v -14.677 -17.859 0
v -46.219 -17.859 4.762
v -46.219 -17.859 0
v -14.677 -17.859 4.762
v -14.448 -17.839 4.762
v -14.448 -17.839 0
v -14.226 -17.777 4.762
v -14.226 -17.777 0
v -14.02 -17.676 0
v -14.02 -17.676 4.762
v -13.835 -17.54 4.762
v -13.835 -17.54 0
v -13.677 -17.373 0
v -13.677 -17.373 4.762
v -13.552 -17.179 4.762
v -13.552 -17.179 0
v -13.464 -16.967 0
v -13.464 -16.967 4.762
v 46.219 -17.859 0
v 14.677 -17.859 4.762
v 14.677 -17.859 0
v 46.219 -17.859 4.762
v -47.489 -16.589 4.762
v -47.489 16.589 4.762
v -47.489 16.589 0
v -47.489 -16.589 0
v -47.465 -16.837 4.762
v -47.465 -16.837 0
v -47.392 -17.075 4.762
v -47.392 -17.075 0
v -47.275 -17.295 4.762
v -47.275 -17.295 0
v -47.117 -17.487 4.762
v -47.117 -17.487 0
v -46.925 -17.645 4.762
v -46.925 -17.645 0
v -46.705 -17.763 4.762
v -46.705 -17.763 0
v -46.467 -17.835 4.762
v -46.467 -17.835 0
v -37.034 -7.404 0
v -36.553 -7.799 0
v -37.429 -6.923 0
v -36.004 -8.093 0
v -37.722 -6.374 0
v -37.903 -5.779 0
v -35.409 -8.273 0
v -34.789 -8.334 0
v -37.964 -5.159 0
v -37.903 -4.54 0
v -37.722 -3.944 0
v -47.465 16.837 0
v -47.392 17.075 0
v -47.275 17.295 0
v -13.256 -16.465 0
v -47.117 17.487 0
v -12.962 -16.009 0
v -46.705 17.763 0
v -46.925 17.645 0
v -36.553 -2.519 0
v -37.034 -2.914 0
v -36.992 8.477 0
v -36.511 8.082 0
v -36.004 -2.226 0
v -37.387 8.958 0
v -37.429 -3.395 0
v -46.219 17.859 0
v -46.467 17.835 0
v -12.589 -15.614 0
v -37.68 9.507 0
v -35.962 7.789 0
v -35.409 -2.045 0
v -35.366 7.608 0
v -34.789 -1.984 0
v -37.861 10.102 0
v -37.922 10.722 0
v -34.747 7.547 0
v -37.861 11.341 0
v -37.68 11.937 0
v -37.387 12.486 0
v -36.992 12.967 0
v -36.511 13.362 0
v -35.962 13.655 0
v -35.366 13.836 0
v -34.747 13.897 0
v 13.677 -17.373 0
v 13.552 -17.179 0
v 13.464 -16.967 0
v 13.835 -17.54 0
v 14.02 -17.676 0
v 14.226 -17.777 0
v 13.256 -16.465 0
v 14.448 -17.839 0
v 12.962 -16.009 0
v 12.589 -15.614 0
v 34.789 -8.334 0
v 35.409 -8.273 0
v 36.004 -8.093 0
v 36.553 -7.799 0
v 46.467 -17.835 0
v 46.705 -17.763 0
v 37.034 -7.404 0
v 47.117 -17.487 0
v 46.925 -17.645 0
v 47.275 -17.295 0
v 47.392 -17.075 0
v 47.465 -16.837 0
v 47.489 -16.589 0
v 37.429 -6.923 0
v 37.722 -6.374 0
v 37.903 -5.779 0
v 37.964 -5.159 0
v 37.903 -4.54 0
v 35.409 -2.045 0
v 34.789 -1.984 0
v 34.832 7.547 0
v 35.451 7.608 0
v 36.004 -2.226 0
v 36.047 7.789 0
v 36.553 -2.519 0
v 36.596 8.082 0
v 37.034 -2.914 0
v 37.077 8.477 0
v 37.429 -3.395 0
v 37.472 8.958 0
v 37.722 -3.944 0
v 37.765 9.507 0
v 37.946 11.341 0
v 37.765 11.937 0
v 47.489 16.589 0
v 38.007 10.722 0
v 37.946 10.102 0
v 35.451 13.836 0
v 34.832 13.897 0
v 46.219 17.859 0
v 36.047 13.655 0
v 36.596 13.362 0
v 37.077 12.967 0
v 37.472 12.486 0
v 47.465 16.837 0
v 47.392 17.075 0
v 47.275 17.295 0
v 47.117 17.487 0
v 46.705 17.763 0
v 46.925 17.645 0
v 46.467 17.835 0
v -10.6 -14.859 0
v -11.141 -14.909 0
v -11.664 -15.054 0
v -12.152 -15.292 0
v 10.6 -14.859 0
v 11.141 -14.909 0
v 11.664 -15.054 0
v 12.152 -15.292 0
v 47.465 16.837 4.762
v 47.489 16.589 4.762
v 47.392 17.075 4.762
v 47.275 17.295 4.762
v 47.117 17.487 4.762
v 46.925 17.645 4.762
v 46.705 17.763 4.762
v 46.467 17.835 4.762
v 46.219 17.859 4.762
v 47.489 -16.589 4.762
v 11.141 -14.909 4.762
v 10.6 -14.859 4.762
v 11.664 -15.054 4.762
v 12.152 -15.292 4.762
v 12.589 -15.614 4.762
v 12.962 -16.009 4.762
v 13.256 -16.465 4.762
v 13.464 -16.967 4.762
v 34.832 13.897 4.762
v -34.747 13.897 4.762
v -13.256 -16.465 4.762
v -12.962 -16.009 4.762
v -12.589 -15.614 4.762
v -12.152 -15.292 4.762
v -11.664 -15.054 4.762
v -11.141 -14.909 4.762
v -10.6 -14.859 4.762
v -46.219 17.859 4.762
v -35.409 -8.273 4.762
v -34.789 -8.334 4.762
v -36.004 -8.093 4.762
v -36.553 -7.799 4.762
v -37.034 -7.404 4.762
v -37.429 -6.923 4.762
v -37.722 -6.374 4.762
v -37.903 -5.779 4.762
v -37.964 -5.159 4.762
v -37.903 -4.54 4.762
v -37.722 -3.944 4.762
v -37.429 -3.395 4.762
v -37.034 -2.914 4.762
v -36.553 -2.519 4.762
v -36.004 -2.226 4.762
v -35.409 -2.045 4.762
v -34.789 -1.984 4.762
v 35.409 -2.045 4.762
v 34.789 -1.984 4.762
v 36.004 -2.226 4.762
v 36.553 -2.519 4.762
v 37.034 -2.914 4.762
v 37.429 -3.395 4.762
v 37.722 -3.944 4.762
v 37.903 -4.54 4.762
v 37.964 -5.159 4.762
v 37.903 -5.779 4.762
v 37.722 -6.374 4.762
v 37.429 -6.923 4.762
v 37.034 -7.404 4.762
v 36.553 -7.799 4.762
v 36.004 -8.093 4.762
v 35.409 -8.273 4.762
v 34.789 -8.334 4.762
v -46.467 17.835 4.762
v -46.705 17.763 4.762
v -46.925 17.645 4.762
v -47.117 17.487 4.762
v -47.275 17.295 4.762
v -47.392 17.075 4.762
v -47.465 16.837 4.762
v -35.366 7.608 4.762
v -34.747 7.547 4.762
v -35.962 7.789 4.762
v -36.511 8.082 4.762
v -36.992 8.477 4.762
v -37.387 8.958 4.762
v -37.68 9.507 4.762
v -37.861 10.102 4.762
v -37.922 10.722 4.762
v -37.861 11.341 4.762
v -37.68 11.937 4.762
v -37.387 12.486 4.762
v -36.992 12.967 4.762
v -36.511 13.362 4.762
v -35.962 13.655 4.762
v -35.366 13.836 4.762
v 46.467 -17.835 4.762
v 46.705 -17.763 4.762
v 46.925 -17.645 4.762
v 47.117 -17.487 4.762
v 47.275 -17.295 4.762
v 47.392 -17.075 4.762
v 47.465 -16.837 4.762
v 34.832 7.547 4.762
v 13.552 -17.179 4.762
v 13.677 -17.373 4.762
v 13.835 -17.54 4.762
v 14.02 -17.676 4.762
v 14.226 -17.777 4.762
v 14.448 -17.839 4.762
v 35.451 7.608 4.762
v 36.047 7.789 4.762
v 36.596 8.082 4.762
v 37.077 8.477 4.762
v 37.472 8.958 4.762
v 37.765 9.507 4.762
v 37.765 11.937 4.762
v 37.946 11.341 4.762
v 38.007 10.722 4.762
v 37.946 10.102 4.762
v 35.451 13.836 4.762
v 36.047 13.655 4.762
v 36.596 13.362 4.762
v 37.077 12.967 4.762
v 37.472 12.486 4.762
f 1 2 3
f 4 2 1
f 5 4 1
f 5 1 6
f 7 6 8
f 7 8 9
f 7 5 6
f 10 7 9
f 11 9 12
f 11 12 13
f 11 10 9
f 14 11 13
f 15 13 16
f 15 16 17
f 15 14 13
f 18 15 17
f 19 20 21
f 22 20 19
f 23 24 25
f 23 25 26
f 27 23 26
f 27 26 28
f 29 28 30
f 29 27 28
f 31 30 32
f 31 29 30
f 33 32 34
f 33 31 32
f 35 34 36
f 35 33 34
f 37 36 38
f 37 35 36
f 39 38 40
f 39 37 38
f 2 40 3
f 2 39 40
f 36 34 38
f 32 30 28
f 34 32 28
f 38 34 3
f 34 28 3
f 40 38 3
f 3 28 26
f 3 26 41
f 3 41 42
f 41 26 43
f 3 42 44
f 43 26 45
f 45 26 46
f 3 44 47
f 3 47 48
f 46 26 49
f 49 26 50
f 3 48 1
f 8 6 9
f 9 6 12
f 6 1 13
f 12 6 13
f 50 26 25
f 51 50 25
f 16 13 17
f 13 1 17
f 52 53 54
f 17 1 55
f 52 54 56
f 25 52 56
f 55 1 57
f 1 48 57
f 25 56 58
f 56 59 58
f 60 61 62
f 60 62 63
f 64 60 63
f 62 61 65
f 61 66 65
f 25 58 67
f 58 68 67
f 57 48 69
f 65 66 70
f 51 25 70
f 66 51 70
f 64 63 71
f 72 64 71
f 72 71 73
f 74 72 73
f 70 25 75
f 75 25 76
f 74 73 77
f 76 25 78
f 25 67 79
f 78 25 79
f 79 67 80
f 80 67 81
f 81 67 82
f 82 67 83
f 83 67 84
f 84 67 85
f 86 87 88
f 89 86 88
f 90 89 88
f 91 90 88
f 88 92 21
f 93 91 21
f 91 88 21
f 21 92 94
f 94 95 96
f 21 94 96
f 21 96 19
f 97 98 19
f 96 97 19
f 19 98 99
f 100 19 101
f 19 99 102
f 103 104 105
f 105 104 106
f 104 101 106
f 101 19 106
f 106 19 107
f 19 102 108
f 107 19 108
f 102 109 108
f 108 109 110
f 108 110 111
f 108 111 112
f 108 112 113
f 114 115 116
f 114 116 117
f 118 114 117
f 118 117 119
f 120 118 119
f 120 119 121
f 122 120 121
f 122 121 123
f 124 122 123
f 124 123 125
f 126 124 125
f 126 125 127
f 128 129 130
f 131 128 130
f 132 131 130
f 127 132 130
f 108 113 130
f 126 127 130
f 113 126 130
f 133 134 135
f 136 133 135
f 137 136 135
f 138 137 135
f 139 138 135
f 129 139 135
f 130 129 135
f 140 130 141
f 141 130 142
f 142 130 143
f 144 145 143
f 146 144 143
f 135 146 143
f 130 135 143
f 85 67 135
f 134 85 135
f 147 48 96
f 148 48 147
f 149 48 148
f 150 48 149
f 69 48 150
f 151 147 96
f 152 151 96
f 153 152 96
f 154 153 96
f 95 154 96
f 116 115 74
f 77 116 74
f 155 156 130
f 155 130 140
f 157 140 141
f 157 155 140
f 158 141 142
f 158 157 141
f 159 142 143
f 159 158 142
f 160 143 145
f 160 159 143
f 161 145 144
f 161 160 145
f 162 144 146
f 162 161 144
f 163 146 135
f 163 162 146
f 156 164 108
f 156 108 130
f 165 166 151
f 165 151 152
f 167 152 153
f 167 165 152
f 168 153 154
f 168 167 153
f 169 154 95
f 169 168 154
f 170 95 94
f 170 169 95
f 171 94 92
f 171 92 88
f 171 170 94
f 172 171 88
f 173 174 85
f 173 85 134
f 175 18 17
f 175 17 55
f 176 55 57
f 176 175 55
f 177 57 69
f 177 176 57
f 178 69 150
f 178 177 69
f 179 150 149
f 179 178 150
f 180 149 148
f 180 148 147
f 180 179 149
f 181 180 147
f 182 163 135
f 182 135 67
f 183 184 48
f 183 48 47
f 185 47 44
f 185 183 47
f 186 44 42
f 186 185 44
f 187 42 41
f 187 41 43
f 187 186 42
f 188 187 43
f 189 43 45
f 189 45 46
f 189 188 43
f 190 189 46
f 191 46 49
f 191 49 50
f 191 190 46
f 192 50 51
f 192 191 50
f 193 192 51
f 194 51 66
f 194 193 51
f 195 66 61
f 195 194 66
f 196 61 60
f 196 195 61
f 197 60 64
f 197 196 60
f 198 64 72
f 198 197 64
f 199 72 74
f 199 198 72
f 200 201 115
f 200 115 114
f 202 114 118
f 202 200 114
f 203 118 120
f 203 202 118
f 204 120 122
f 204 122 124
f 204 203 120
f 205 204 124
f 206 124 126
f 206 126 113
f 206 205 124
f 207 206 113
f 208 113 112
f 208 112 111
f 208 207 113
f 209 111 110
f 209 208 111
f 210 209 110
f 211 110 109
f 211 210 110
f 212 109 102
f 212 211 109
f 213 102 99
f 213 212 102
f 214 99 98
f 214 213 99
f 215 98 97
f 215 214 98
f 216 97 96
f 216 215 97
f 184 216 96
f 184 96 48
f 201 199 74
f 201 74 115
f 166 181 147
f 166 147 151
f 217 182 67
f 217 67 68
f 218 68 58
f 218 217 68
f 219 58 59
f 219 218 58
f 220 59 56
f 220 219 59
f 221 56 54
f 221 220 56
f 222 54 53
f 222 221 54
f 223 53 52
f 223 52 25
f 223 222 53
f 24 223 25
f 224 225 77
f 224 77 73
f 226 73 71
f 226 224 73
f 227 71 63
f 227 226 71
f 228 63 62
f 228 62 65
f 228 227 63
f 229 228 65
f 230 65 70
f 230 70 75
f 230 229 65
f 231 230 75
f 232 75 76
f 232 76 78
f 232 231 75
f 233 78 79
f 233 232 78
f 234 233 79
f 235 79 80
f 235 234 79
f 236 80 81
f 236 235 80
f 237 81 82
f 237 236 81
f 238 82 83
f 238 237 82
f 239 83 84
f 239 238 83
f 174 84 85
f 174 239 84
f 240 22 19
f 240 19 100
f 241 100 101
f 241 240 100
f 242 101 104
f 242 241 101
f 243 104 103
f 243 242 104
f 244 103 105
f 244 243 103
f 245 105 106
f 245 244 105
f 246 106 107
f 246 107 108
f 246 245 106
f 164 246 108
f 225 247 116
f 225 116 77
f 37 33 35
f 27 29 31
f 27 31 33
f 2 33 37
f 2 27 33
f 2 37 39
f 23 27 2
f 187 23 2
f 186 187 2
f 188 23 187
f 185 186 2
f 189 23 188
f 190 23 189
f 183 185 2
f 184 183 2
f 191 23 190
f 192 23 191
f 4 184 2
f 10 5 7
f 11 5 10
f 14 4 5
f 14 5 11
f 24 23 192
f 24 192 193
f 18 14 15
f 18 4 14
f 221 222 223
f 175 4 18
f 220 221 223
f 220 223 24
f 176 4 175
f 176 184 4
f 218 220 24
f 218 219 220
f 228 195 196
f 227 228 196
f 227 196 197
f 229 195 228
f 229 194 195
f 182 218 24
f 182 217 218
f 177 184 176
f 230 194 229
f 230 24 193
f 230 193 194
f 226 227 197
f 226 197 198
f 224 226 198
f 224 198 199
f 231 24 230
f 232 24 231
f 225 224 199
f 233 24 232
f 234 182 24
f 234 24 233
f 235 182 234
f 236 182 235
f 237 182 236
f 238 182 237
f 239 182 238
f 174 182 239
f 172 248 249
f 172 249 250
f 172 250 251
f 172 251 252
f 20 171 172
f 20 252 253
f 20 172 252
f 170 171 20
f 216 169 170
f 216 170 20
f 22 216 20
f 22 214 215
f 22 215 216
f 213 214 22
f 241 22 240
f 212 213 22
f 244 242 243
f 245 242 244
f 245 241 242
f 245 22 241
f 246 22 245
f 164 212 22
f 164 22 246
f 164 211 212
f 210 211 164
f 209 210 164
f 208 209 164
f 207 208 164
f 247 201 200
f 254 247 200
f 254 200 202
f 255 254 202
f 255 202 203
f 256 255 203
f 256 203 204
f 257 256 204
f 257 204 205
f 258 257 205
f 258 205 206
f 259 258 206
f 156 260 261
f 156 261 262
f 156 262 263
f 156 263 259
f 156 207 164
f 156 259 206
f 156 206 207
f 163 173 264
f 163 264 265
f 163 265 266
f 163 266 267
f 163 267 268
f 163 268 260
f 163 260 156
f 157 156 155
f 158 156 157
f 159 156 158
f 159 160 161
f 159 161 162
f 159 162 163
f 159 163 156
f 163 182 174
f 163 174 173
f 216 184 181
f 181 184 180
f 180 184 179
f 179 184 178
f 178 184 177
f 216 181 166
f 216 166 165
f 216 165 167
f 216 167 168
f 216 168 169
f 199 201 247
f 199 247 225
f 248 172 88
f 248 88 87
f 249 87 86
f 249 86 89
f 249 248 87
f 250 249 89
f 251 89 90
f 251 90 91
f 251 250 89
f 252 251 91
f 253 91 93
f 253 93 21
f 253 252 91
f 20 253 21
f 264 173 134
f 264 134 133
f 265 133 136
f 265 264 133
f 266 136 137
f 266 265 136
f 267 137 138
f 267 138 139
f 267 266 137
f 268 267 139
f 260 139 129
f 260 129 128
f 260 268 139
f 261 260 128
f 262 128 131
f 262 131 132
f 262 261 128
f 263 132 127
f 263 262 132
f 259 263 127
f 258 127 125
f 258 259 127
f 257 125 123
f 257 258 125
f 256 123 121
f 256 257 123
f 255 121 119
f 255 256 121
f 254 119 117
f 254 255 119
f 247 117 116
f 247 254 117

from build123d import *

# Parameters (mm, degrees)
BOSS_EXTRUDE1_DEPTH = 4.7625


with BuildPart() as part:
    # Sketch1 → Boss-Extrude1 (new body)
    with BuildSketch(Plane.XY.offset(4.7625)):
        with BuildLine():
            Line((-46.21916, -17.859375), (-14.676763422, -17.859375))
            ThreePointArc((-14.676763422, -17.859375), (-13.924040029, -17.612266731), (-13.464236596, -16.967103337))
            ThreePointArc((-13.464236596, -16.967103337), (-12.378086754, -15.44309532), (-10.6, -14.859375))
            Line((-10.6, -14.859375), (10.6, -14.859375))
            ThreePointArc((10.6, -14.859375), (12.378086754, -15.44309532), (13.464236596, -16.967103337))
            ThreePointArc((13.464236596, -16.967103337), (13.924040029, -17.612266731), (14.676763422, -17.859375))
            Line((14.676763422, -17.859375), (46.21916, -17.859375))
            ThreePointArc((46.21916, -17.859375), (47.117185612, -17.487400612), (47.48916, -16.589375))
            Line((47.48916, -16.589375), (47.48916, 16.589375))
            ThreePointArc((47.48916, 16.589375), (47.117185612, 17.487400612), (46.21916, 17.859375))
            Line((46.21916, 17.859375), (-46.21916, 17.859375))
            ThreePointArc((-46.21916, 17.859375), (-47.117185612, 17.487400612), (-47.48916, 16.589375))
            Line((-47.48916, 16.589375), (-47.48916, -16.589375))
            ThreePointArc((-47.48916, -16.589375), (-47.117185612, -17.487400612), (-46.21916, -17.859375))
        make_face()
        with BuildLine():
            Line((34.78916, -8.334375), (-34.78916, -8.334375))
            ThreePointArc((-34.78916, -8.334375), (-37.96416, -5.159375), (-34.78916, -1.984375))
            Line((-34.78916, -1.984375), (34.78916, -1.984375))
            ThreePointArc((34.78916, -1.984375), (37.96416, -5.159375), (34.78916, -8.334375))
        make_face(mode=Mode.SUBTRACT)
        with BuildLine():
            Line((34.8316655, 7.546875), (-34.7466545, 7.546875))
            ThreePointArc((-34.7466545, 7.546875), (-37.9216545, 10.721875), (-34.7466545, 13.896875))
            Line((-34.7466545, 13.896875), (34.8316655, 13.896875))
            ThreePointArc((34.8316655, 13.896875), (38.0066655, 10.721875), (34.8316655, 7.546875))
        make_face(mode=Mode.SUBTRACT)
    extrude(amount=-BOSS_EXTRUDE1_DEPTH)


solid = part.part
